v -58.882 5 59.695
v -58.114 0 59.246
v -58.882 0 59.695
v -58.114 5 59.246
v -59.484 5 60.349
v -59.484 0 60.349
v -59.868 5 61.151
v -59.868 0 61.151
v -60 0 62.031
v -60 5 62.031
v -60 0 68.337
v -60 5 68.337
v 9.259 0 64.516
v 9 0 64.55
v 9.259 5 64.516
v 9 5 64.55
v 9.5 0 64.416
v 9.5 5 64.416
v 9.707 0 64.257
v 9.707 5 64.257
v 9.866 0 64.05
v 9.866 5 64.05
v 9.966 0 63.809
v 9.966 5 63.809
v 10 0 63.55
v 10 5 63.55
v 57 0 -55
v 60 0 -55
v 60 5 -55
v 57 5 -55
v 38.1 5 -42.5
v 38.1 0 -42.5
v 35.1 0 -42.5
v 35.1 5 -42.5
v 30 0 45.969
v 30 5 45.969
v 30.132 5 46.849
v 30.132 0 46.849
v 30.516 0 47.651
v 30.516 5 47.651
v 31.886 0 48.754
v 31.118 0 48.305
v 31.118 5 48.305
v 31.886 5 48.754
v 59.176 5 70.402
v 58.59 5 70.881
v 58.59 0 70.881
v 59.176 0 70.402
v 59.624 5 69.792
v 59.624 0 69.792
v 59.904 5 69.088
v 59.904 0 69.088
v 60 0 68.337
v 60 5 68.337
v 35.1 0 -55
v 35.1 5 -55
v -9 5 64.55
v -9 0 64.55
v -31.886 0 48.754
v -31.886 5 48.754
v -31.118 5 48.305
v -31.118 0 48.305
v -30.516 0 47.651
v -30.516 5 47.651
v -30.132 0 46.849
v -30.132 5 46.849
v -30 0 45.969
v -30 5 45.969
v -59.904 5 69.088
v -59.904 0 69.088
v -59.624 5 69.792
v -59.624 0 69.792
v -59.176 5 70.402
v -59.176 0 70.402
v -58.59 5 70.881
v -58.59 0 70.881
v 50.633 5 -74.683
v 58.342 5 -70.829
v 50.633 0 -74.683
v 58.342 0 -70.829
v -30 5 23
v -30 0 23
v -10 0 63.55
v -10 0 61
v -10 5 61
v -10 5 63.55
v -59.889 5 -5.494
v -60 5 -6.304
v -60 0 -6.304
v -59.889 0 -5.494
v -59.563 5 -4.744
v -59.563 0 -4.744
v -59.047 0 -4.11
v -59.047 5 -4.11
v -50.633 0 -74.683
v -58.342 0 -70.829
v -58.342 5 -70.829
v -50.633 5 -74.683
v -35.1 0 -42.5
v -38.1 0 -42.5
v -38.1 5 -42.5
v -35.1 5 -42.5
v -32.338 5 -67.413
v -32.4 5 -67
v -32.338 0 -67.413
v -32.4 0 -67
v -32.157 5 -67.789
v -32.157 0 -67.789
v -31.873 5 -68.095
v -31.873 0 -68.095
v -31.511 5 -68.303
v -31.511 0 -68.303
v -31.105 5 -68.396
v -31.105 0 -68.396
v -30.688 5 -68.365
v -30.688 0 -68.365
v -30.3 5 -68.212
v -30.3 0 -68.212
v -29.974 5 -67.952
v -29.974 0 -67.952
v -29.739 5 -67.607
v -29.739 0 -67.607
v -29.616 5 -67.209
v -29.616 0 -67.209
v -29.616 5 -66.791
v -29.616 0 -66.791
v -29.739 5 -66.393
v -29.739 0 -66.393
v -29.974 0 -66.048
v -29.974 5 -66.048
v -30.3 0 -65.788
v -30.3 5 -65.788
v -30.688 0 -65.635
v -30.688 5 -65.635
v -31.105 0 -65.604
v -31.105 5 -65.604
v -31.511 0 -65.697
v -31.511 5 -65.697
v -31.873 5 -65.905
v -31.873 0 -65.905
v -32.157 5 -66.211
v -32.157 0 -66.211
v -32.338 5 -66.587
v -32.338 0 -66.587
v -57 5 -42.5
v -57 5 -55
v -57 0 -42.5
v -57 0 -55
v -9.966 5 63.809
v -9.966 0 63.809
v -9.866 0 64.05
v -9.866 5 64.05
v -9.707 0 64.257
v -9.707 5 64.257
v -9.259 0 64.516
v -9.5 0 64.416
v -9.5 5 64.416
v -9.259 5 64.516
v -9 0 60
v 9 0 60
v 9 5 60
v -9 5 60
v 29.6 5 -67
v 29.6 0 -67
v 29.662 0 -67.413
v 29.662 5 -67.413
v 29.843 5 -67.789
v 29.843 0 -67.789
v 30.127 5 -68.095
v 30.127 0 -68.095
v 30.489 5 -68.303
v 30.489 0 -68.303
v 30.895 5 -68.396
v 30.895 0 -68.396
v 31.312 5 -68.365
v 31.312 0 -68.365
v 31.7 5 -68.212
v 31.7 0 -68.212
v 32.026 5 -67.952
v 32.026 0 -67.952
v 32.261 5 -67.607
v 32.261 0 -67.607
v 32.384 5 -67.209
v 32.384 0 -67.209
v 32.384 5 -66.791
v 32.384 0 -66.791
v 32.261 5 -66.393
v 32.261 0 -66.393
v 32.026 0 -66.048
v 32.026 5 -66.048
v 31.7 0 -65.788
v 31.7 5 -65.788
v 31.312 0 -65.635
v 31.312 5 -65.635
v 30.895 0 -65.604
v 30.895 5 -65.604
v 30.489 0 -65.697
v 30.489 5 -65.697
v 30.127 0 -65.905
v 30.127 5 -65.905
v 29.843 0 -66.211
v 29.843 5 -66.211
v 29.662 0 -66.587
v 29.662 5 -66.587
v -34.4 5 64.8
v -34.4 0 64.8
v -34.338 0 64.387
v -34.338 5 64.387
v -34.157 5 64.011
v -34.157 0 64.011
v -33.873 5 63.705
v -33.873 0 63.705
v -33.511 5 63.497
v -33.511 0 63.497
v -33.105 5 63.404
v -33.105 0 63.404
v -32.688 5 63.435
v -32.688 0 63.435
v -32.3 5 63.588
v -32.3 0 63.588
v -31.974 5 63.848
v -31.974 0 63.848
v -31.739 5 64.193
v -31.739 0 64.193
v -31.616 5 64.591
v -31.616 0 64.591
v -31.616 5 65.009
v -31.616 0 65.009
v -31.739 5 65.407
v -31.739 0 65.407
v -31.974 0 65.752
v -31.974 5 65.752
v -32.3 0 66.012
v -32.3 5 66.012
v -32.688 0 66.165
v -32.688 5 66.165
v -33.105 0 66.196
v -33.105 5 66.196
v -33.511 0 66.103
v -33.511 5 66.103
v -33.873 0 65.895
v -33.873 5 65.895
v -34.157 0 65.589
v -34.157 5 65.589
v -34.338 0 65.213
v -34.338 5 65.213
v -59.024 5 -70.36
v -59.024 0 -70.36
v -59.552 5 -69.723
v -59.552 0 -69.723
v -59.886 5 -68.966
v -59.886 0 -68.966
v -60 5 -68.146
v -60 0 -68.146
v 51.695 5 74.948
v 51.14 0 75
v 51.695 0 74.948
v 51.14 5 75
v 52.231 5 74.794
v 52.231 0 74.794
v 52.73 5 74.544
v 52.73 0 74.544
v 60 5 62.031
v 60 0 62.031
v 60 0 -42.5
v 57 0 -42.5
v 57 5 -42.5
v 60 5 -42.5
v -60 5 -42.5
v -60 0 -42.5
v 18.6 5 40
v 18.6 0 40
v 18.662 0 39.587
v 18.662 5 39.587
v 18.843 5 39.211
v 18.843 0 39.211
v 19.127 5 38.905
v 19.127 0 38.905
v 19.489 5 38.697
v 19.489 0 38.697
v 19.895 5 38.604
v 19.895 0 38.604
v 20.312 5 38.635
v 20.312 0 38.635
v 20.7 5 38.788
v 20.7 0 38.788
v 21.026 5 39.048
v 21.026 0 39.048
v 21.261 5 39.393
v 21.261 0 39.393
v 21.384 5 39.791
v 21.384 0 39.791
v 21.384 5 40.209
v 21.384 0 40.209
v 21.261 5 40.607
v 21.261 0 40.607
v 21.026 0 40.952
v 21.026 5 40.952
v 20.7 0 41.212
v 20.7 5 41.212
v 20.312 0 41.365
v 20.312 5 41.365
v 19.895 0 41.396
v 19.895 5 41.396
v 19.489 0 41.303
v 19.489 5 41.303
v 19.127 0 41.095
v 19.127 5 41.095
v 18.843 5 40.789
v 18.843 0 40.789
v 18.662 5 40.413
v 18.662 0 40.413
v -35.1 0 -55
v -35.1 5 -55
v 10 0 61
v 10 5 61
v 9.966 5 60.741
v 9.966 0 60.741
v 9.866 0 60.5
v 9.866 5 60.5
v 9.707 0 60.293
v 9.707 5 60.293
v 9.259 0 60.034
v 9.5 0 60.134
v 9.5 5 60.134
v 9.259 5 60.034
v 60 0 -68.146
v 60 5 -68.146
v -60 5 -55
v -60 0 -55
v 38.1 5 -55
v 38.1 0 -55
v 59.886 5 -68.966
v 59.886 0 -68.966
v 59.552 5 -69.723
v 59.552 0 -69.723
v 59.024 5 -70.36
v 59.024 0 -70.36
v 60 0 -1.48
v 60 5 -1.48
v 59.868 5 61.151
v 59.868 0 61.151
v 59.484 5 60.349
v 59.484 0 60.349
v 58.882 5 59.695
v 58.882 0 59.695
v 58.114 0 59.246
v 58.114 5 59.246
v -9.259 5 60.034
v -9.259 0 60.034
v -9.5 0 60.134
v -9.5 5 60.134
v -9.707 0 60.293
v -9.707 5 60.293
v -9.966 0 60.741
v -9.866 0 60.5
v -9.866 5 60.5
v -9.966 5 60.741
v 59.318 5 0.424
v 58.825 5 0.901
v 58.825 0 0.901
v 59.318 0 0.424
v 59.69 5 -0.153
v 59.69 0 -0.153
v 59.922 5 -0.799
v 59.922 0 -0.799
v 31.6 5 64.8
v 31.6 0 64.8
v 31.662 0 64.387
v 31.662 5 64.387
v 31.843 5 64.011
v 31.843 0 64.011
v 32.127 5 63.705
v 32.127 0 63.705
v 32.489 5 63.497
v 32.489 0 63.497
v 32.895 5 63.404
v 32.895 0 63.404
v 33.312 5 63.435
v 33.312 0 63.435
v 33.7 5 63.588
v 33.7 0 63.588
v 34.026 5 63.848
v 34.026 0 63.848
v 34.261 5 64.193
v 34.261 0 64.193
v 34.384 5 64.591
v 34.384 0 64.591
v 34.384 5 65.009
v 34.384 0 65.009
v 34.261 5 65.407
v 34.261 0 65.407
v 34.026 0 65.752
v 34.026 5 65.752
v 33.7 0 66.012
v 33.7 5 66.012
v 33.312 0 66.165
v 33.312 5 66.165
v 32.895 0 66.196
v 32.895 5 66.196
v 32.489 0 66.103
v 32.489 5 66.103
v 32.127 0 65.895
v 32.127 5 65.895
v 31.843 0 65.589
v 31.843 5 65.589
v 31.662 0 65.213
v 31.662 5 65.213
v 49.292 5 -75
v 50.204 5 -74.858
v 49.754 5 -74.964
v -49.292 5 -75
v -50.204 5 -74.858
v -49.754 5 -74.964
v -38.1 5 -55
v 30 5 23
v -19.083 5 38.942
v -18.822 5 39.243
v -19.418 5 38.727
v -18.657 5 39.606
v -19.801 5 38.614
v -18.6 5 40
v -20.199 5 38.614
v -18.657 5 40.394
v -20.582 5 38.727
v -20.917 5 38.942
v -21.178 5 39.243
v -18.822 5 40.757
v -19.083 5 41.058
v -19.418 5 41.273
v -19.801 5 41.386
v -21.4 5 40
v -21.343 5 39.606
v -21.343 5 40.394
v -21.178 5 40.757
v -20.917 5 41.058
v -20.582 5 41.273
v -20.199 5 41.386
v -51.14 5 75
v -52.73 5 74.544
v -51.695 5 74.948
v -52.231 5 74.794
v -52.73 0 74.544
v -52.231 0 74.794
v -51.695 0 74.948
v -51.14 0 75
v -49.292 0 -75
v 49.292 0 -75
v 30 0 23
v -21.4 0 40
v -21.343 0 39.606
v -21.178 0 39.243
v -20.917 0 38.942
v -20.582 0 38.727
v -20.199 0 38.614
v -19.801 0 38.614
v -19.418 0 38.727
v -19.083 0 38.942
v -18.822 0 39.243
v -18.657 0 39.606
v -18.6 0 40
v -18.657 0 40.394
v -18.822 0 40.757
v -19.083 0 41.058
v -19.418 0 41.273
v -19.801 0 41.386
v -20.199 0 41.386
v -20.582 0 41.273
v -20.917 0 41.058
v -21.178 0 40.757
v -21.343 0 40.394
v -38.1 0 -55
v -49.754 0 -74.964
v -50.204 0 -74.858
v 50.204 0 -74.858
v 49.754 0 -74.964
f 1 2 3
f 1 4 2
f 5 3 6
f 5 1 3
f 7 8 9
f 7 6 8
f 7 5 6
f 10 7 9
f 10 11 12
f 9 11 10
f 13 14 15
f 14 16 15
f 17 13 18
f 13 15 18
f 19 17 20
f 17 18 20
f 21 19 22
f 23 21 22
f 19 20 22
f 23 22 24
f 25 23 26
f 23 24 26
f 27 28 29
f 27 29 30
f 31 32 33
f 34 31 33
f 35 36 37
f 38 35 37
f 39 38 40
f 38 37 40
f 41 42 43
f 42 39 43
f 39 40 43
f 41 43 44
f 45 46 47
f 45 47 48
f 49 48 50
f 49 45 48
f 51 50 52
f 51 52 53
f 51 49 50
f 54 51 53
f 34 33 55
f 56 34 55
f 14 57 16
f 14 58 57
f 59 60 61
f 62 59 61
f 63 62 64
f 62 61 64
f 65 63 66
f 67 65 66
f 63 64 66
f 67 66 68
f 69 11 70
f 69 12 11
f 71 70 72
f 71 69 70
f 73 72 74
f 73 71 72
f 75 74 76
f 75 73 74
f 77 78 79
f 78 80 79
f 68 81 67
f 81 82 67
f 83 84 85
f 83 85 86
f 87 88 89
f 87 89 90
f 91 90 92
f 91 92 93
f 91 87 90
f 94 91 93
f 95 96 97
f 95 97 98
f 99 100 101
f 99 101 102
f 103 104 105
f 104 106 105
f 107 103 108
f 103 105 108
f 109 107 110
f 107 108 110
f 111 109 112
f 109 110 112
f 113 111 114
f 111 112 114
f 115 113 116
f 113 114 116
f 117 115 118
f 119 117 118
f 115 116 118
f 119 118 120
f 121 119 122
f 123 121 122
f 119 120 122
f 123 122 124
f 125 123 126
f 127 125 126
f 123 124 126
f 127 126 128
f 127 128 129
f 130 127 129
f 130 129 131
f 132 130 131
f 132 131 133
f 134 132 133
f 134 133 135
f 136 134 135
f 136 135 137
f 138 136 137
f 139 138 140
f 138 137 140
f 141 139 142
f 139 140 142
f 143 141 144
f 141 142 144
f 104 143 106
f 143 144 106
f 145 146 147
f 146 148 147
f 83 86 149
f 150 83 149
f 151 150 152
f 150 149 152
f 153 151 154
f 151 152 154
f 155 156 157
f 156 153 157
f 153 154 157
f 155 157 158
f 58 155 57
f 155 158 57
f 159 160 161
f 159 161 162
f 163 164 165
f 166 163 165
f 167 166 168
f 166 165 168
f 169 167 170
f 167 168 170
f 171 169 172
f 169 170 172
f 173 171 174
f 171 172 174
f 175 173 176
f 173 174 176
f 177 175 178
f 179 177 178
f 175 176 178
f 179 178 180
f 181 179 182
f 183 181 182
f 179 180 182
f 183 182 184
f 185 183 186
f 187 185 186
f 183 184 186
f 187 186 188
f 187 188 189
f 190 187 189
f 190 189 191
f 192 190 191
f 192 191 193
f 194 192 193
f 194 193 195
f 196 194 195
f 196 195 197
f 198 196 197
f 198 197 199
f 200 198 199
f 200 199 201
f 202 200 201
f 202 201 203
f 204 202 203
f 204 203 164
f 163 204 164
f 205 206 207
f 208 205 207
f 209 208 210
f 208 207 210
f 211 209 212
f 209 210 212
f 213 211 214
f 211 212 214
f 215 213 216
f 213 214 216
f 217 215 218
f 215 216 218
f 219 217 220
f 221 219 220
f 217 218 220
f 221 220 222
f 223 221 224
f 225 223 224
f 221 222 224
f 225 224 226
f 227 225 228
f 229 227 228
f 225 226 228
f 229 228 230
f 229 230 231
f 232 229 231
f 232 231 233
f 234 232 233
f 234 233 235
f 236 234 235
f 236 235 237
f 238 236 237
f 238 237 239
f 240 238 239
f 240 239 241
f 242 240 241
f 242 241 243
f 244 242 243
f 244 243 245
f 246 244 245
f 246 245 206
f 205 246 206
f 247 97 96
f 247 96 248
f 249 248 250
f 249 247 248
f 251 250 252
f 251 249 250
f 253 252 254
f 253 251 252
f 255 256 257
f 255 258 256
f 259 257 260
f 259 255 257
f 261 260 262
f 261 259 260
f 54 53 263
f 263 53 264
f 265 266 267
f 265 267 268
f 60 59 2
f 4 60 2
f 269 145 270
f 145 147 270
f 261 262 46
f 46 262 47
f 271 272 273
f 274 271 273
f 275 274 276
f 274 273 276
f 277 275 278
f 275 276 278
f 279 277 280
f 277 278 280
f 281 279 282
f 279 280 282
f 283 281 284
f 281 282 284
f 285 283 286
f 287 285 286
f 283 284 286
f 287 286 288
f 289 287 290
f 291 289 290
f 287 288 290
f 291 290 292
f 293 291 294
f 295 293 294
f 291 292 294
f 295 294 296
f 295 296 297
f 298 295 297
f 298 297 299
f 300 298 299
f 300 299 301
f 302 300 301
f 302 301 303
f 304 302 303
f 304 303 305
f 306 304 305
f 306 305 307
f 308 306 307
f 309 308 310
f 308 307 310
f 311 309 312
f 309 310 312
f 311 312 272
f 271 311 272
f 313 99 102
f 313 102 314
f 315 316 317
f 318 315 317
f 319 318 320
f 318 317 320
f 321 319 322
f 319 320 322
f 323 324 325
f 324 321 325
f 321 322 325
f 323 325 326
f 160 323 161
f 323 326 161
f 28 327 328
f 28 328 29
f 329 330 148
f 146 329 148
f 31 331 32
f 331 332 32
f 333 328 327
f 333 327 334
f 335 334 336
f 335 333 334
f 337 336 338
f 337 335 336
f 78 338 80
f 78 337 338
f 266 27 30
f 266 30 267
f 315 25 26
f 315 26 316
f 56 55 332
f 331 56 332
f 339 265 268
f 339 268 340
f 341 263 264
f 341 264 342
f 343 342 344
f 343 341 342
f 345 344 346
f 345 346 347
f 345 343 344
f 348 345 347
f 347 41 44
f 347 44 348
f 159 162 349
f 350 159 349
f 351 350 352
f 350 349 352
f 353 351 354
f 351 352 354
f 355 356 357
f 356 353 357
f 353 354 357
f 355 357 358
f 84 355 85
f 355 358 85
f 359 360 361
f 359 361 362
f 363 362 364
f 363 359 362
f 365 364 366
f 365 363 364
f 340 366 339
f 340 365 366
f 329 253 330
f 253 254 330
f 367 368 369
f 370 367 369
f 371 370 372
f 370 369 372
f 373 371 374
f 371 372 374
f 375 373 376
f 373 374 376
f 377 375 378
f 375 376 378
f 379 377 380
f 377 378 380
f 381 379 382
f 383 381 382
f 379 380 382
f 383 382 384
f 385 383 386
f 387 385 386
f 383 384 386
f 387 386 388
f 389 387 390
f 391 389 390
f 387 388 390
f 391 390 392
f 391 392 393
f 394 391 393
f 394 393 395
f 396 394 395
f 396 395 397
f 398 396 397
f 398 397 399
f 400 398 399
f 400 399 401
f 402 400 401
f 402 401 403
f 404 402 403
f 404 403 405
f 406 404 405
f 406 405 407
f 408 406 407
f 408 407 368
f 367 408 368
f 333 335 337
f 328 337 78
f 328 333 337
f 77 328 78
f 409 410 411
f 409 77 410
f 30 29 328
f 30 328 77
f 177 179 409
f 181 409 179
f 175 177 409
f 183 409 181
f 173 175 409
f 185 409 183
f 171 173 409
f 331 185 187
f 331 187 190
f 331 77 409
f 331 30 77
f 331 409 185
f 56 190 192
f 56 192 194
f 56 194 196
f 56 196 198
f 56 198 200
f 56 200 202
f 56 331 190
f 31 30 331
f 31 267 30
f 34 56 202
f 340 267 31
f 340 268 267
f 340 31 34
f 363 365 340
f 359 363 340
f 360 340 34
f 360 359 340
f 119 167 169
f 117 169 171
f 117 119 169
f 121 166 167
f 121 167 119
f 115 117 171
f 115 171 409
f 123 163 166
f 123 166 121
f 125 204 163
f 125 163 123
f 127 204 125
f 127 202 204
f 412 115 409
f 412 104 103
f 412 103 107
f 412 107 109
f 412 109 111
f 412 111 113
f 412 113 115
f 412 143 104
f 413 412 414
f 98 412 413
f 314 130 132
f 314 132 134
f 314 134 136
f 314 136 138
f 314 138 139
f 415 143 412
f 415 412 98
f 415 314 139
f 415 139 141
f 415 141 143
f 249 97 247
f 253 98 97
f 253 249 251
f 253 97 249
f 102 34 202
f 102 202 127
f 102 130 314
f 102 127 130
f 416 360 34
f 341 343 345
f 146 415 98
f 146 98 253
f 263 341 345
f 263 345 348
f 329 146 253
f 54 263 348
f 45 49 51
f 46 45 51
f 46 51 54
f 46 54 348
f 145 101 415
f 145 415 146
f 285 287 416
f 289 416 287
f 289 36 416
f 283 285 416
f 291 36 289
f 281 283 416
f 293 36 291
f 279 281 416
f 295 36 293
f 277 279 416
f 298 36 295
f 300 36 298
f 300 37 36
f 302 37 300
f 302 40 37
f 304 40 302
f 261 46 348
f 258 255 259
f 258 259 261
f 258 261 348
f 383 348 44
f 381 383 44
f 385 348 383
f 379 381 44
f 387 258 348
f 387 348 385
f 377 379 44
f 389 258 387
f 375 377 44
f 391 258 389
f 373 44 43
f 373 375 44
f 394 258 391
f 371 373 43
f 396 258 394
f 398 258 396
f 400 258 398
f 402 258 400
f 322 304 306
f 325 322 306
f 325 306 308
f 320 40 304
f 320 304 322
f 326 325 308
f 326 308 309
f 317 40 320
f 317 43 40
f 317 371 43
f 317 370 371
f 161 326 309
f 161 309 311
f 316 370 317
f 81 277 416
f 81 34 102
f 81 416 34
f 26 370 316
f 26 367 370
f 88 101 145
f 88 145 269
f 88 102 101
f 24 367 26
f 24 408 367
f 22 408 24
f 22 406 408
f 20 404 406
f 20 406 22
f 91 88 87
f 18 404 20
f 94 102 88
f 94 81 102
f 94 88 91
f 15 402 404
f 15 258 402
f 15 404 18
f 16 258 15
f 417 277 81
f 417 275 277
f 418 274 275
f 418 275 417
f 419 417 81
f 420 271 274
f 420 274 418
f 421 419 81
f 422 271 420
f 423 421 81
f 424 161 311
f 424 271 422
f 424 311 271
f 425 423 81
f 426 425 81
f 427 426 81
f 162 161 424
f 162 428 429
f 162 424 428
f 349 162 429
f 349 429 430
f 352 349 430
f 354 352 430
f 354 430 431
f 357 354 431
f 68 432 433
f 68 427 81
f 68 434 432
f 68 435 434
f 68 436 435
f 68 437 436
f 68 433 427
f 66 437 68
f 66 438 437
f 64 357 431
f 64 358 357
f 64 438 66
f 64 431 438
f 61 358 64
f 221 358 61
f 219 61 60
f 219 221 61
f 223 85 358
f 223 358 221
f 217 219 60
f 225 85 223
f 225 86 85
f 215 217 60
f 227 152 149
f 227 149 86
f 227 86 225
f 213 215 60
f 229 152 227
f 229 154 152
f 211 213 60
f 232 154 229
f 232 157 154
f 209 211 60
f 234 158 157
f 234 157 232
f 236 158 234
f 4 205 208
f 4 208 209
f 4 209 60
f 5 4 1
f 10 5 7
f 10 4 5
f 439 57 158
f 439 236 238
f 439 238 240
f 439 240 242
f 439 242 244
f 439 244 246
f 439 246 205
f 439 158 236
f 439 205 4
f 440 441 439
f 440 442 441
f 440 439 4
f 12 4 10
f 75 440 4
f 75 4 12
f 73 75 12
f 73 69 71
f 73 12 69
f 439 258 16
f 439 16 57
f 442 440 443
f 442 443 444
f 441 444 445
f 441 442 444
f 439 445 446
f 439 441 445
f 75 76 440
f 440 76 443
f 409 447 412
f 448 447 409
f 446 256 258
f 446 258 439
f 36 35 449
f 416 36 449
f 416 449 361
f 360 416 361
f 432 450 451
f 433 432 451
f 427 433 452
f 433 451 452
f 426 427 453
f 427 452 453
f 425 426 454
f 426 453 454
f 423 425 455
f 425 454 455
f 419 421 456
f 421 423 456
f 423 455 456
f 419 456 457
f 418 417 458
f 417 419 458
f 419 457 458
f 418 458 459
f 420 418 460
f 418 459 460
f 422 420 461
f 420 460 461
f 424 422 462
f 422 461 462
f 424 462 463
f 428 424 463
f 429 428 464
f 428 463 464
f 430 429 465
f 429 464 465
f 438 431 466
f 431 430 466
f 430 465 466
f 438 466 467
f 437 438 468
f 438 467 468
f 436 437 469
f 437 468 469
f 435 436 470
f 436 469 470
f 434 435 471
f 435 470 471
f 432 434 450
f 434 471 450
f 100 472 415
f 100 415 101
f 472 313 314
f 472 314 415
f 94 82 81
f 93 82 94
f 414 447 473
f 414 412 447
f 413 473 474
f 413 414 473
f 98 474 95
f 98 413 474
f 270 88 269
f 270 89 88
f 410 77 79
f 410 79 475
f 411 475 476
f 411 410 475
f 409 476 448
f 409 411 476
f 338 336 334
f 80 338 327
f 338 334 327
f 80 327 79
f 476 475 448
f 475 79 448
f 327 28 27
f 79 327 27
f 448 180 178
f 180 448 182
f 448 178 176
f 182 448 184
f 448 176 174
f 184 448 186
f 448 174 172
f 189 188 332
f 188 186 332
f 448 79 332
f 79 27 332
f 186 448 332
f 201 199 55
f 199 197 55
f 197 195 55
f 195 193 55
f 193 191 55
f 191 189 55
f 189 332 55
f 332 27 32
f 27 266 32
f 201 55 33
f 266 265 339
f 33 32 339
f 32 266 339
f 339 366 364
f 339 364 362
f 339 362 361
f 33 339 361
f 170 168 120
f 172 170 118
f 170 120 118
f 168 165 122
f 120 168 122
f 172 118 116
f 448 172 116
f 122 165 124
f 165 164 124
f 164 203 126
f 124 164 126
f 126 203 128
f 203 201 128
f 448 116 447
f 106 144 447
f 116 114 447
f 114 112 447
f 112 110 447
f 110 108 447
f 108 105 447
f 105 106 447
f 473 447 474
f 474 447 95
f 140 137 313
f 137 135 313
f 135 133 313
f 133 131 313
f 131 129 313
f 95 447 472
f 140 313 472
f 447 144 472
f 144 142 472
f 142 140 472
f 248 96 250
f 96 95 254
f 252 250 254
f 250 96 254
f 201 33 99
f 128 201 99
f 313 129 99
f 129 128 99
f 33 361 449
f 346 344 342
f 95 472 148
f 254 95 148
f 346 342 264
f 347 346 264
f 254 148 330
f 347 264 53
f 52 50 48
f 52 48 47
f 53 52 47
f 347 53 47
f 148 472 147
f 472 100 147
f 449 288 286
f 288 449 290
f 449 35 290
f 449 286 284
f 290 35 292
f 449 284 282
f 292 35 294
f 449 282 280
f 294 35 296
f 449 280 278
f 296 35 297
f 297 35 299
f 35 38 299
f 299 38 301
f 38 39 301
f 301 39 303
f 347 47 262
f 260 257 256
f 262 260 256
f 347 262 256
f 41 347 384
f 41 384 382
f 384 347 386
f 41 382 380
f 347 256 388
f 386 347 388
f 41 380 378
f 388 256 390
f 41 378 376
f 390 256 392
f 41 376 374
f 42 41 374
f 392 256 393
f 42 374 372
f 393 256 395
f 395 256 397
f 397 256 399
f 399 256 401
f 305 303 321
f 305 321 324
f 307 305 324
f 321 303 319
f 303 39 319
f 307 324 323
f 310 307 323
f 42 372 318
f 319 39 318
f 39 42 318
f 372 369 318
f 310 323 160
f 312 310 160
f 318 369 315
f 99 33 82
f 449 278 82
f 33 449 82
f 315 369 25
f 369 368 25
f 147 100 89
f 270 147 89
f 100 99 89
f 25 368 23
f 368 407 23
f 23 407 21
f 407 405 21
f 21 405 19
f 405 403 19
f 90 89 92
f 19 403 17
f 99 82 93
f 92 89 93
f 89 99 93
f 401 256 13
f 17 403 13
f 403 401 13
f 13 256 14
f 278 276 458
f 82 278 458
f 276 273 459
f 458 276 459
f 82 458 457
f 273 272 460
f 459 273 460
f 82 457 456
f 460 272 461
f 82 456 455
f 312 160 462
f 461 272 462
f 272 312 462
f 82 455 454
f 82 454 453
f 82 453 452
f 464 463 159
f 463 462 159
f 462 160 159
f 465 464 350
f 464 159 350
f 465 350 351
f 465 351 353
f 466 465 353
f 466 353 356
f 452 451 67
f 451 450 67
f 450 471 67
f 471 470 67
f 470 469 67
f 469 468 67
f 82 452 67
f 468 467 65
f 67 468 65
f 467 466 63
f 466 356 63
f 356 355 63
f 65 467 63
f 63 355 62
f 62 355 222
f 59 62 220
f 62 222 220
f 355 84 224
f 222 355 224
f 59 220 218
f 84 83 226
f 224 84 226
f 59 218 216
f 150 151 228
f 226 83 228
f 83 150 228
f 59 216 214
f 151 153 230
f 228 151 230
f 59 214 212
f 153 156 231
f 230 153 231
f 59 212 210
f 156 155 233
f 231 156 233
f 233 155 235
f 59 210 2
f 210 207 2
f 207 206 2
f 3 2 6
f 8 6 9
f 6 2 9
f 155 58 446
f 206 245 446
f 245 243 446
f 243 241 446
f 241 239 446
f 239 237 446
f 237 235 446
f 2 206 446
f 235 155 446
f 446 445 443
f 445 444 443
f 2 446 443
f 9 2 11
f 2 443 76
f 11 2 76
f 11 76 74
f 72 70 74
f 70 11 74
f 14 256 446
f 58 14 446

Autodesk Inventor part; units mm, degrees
ref_plane "YZ Plane" through (0, 0, 0) normal (1, 0, 0) x (0, 1, 0)
ref_plane "XZ Plane" through (0, 0, 0) normal (0, 1, 0) x (-1, 0, 0)
ref_plane "XY Plane" through (0, 0, 0) normal (0, 0, 1) x (1, 0, 0)
sketch "Sketch1" plane through (0, 0, 0) normal (0, 1, 0) x (-1, 0, 0)
  line L0 (-60, 75) -> (60, 75)
  line L1 (60, -75) -> (-60, -75)
  line L2 (-60, 75) -> (60, -75) construction
  line L3 (60, 75) -> (-60, -75) construction
  line L4 (-60, -75) -> (-60, -55)
  line L5 (-60, -55) -> (-57, -55)
  line L6 (-60, -55) -> (-57, -55)
  line L7 (-57, -55) -> (-57, -42.5)
  line L8 (-57, -42.5) -> (-60, -42.5)
  line L9 (-60, -42.5) -> (-60, -55)
  line L10 (-57, -42.5) -> (-38.1, -42.5)
  line L11 (-38.1, -42.5) -> (-35.1, -42.5)
  line L12 (-35.1, -42.5) -> (-35.1, -55)
  line L13 (-35.1, -55) -> (-38.1, -55)
  line L14 (-38.1, -55) -> (-38.1, -42.5)
  line L15 (0, 75) -> (0, 64.8)
  line L16 (0, 64.8) -> (-33, 64.8)
  line L17 (-33, 64.8) -> (33, 64.8)
  circle A0 centre (-33, 64.8) radius 1.4
  circle A1 centre (33, 64.8) radius 1.4
  line L18 (0, 75) -> (0, 40)
  line L19 (0, 40) -> (-20, 40)
  line L20 (-20, 40) -> (20, 40)
  circle A2 centre (20, 40) radius 1.4
  circle A3 centre (-20, 40) radius 1.4
  line L21 (-60, -75) -> (-60, -5)
  line L22 (-4, -5) -> (4, -5)
  line L23 (-60, 75) -> (-60, 60)
  line L24 (-60, 60) -> (60, 60)
  line L25 (-20, 40) -> (-21.4, 40)
  line L26 (20, 40) -> (21.4, 40)
  line L27 (-30, 40) -> (-30, 10)
  line L28 (-30, 10) -> (-60, 0)
  line L29 (30, 40) -> (30, 10)
  line L30 (30, 10) -> (60, -5)
  line L31 (-30, 40) -> (-30, 48)
  line L32 (-30, 48) -> (-60, 60)
  line L33 (30, 40) -> (30, 48)
  line L34 (30, 48) -> (60, 60)
  line L35 (0, 75) -> (0, -75)
  line L36 (0, -75) -> (-60, -75)
  line L37 (0, 75) -> (-60, 75)
  line L38 (60, -70) -> (60, -55)
  line L39 (60, -55) -> (57, -55)
  line L40 (57, -55) -> (57, -42.5)
  line L41 (57, -42.5) -> (60, -42.5)
  line L42 (60, -42.5) -> (60, -55)
  line L43 (57, -42.5) -> (38.1, -42.5)
  line L44 (38.1, -42.5) -> (35.1, -42.5)
  line L45 (35.1, -42.5) -> (35.1, -55)
  line L46 (35.1, -55) -> (38.1, -55)
  line L47 (38.1, -55) -> (38.1, -42.5)
  line L48 (60, 75) -> (52, 75)
  line L49 (52, 75) -> (52, 70)
  line L50 (52, 70) -> (60, 70)
  line L51 (60, 70) -> (60, 75)
  line L52 (-60, 75) -> (-52, 75)
  line L53 (-52, 75) -> (-52, 70)
  line L54 (-52, 70) -> (-60, 70)
  line L55 (-60, 70) -> (-60, 75)
  line L56 (60, 70) -> (52, 75)
  line L57 (-52, 75) -> (-60, 70)
  line L58 (60, 75) -> (60, 60)
  line L59 (60, -5) -> (60, -70)
  line L60 (-60, -75) -> (-60, 0)
  line L61 (-60, 60) -> (-60, 75)
  line L62 (57, -75) -> (50, -75)
  line L63 (50, -75) -> (50, -70)
  line L64 (50, -70) -> (60, -70)
  line L65 (60, -70) -> (60, -75)
  line L66 (-60, -75) -> (-50, -75)
  line L67 (-50, -75) -> (-50, -70)
  line L68 (-50, -70) -> (-60, -70)
  line L69 (-60, -70) -> (-60, -75)
  line L70 (-60, -70) -> (-50, -75)
  line L71 (60, -70) -> (50, -75)
  line L72 (33, 64.8) -> (33, 62.8)
  line L73 (33, 62.8) -> (-33, 62.8)
  line L74 (-33, 62.8) -> (-33, 64.8)
  line L75 (0, 62.8) -> (10, 62.8)
  line L76 (10, 62.8) -> (-10, 62.8)
  line L77 (-10, 61.05) -> (10, 61.05)
  line L78 (10, 61.05) -> (10, 64.55)
  line L79 (10, 64.55) -> (-10, 64.55)
  line L80 (-10, 64.55) -> (-10, 61.05)
  line L81 (-10, 61.05) -> (10, 64.55) construction
  line L82 (10, 61.05) -> (-10, 64.55) construction
  line L83 (10, 61.05) -> (-10, 61.05)
  line L84 (-10, 61.05) -> (-10, 60)
  line L85 (-10, 60) -> (10, 60)
  line L86 (10, 60) -> (10, 61.05)
  line L87 (30, 48) -> (30, 23)
  line L88 (30, 23) -> (60, -5)
  line L89 (-30, 48) -> (-30, 23)
  line L90 (-30, 23) -> (-60, 0)
  line L91 (60, -75) -> (31, -75)
  line L92 (31, -75) -> (31, -67)
  line L93 (31, -67) -> (60, -67)
  line L94 (60, -67) -> (60, -75)
  line L95 (-60, -75) -> (-31, -75)
  line L96 (-31, -75) -> (-31, -67)
  line L97 (-31, -67) -> (-60, -67)
  line L98 (-60, -67) -> (-60, -75)
  circle A4 centre (-31, -67) radius 1.4
  circle A5 centre (31, -67) radius 1.4
  point P0 (0, 0)
  dimension "d16" = 2.8
  dimension "d17" = 2.8
  dimension "d0" = 120
  dimension "d1" = 150
  dimension "d2" = 20
  dimension "d3" = 3
  dimension "d4" = 3
  dimension "d5" = 12.5
  dimension "d6" = 18.9
  dimension "d7" = 3
  dimension "d8" = 10.2
  dimension "d9" = 33
  dimension "d10" = 66
  dimension "d11" = 2.8
  dimension "d12" = 2.8
  dimension "d13" = 35
  dimension "d14" = 20
  dimension "d15" = 40
  dimension "d18" = 70
  dimension "d19" = 15
  dimension "d20" = 10
  dimension "d21" = 10
  dimension "d22" = 30
  dimension "d23" = 30
  dimension "d24" = 8
  dimension "d25" = 8
  dimension "d26" = 20
  dimension "d27" = 3
  dimension "d28" = 12.5
  dimension "d29" = 18.9
  dimension "d30" = 3
  dimension "d31" = 8
  dimension "d32" = 5
  dimension "d33" = 8
  dimension "d34" = 5
  dimension "d35" = 10
  dimension "d36" = 5
  dimension "d37" = 10
  dimension "d38" = 5
  dimension "d42" = 2
  dimension "d43" = 10
  dimension "d44" = 20
  dimension "d45" = 3.5
  dimension "d47" = 25
  dimension "d48" = 25
  dimension "d49" = 29
  dimension "d50" = 8
  dimension "d51" = 29
  dimension "d52" = 8
  dimension "d53" = 2.8
  dimension "d54" = 2.8
extrude "Extrusion1" add sketch "Sketch1" along normal blind 5 contours L0 L15 L16 A0 L74 L73 L80 L84 L24 L23 L54 L53 | L53 L54 L57 | L0 L49 L50 L58 L24 L86 L78 L73 L72 A1 L17 L15 | L24 L18 L35 L1 L96 A4 L97 L4 L5 L7 L8 L21 L60 L28 L27 L31 L32 | L56 L50 L49 | L18 L79 L80 L73 L74 A0 L16 | L17 A1 L72 L73 L78 L79 L18 | L24 L34 L33 L29 L30 L59 L41 L40 L39 L38 L93 A5 L92 L1 L35 L18 | L27 L28 L90 | L88 L30 L29 | L92 A5 L93 L38 L64 L63 L1 | L1 L67 L68 L4 L97 A4 L96 | L63 L64 L71 | L70 L68 L67
fillet "Fillet1" radius 3 14 edges at (-52, 2.5, 75) (-60, 2.5, 70) (-60, 2.5, 60) (-30, 2.5, 48) (-60, 2.5, -5) (-50, 2.5, -75) (-60, 2.5, -70) (60, 2.5, -70) (50, 2.5, -75) (60, 2.5, 0) (30, 2.5, 48) (52, 2.5, 75) (60, 2.5, 70) (60, 2.5, 60)
fillet "Fillet2" radius 1 4 edges at (-10, 2.5, 64.55) (-10, 2.5, 60) (10, 2.5, 64.55) (10, 2.5, 60)
properties part number "KhungDuoi"
